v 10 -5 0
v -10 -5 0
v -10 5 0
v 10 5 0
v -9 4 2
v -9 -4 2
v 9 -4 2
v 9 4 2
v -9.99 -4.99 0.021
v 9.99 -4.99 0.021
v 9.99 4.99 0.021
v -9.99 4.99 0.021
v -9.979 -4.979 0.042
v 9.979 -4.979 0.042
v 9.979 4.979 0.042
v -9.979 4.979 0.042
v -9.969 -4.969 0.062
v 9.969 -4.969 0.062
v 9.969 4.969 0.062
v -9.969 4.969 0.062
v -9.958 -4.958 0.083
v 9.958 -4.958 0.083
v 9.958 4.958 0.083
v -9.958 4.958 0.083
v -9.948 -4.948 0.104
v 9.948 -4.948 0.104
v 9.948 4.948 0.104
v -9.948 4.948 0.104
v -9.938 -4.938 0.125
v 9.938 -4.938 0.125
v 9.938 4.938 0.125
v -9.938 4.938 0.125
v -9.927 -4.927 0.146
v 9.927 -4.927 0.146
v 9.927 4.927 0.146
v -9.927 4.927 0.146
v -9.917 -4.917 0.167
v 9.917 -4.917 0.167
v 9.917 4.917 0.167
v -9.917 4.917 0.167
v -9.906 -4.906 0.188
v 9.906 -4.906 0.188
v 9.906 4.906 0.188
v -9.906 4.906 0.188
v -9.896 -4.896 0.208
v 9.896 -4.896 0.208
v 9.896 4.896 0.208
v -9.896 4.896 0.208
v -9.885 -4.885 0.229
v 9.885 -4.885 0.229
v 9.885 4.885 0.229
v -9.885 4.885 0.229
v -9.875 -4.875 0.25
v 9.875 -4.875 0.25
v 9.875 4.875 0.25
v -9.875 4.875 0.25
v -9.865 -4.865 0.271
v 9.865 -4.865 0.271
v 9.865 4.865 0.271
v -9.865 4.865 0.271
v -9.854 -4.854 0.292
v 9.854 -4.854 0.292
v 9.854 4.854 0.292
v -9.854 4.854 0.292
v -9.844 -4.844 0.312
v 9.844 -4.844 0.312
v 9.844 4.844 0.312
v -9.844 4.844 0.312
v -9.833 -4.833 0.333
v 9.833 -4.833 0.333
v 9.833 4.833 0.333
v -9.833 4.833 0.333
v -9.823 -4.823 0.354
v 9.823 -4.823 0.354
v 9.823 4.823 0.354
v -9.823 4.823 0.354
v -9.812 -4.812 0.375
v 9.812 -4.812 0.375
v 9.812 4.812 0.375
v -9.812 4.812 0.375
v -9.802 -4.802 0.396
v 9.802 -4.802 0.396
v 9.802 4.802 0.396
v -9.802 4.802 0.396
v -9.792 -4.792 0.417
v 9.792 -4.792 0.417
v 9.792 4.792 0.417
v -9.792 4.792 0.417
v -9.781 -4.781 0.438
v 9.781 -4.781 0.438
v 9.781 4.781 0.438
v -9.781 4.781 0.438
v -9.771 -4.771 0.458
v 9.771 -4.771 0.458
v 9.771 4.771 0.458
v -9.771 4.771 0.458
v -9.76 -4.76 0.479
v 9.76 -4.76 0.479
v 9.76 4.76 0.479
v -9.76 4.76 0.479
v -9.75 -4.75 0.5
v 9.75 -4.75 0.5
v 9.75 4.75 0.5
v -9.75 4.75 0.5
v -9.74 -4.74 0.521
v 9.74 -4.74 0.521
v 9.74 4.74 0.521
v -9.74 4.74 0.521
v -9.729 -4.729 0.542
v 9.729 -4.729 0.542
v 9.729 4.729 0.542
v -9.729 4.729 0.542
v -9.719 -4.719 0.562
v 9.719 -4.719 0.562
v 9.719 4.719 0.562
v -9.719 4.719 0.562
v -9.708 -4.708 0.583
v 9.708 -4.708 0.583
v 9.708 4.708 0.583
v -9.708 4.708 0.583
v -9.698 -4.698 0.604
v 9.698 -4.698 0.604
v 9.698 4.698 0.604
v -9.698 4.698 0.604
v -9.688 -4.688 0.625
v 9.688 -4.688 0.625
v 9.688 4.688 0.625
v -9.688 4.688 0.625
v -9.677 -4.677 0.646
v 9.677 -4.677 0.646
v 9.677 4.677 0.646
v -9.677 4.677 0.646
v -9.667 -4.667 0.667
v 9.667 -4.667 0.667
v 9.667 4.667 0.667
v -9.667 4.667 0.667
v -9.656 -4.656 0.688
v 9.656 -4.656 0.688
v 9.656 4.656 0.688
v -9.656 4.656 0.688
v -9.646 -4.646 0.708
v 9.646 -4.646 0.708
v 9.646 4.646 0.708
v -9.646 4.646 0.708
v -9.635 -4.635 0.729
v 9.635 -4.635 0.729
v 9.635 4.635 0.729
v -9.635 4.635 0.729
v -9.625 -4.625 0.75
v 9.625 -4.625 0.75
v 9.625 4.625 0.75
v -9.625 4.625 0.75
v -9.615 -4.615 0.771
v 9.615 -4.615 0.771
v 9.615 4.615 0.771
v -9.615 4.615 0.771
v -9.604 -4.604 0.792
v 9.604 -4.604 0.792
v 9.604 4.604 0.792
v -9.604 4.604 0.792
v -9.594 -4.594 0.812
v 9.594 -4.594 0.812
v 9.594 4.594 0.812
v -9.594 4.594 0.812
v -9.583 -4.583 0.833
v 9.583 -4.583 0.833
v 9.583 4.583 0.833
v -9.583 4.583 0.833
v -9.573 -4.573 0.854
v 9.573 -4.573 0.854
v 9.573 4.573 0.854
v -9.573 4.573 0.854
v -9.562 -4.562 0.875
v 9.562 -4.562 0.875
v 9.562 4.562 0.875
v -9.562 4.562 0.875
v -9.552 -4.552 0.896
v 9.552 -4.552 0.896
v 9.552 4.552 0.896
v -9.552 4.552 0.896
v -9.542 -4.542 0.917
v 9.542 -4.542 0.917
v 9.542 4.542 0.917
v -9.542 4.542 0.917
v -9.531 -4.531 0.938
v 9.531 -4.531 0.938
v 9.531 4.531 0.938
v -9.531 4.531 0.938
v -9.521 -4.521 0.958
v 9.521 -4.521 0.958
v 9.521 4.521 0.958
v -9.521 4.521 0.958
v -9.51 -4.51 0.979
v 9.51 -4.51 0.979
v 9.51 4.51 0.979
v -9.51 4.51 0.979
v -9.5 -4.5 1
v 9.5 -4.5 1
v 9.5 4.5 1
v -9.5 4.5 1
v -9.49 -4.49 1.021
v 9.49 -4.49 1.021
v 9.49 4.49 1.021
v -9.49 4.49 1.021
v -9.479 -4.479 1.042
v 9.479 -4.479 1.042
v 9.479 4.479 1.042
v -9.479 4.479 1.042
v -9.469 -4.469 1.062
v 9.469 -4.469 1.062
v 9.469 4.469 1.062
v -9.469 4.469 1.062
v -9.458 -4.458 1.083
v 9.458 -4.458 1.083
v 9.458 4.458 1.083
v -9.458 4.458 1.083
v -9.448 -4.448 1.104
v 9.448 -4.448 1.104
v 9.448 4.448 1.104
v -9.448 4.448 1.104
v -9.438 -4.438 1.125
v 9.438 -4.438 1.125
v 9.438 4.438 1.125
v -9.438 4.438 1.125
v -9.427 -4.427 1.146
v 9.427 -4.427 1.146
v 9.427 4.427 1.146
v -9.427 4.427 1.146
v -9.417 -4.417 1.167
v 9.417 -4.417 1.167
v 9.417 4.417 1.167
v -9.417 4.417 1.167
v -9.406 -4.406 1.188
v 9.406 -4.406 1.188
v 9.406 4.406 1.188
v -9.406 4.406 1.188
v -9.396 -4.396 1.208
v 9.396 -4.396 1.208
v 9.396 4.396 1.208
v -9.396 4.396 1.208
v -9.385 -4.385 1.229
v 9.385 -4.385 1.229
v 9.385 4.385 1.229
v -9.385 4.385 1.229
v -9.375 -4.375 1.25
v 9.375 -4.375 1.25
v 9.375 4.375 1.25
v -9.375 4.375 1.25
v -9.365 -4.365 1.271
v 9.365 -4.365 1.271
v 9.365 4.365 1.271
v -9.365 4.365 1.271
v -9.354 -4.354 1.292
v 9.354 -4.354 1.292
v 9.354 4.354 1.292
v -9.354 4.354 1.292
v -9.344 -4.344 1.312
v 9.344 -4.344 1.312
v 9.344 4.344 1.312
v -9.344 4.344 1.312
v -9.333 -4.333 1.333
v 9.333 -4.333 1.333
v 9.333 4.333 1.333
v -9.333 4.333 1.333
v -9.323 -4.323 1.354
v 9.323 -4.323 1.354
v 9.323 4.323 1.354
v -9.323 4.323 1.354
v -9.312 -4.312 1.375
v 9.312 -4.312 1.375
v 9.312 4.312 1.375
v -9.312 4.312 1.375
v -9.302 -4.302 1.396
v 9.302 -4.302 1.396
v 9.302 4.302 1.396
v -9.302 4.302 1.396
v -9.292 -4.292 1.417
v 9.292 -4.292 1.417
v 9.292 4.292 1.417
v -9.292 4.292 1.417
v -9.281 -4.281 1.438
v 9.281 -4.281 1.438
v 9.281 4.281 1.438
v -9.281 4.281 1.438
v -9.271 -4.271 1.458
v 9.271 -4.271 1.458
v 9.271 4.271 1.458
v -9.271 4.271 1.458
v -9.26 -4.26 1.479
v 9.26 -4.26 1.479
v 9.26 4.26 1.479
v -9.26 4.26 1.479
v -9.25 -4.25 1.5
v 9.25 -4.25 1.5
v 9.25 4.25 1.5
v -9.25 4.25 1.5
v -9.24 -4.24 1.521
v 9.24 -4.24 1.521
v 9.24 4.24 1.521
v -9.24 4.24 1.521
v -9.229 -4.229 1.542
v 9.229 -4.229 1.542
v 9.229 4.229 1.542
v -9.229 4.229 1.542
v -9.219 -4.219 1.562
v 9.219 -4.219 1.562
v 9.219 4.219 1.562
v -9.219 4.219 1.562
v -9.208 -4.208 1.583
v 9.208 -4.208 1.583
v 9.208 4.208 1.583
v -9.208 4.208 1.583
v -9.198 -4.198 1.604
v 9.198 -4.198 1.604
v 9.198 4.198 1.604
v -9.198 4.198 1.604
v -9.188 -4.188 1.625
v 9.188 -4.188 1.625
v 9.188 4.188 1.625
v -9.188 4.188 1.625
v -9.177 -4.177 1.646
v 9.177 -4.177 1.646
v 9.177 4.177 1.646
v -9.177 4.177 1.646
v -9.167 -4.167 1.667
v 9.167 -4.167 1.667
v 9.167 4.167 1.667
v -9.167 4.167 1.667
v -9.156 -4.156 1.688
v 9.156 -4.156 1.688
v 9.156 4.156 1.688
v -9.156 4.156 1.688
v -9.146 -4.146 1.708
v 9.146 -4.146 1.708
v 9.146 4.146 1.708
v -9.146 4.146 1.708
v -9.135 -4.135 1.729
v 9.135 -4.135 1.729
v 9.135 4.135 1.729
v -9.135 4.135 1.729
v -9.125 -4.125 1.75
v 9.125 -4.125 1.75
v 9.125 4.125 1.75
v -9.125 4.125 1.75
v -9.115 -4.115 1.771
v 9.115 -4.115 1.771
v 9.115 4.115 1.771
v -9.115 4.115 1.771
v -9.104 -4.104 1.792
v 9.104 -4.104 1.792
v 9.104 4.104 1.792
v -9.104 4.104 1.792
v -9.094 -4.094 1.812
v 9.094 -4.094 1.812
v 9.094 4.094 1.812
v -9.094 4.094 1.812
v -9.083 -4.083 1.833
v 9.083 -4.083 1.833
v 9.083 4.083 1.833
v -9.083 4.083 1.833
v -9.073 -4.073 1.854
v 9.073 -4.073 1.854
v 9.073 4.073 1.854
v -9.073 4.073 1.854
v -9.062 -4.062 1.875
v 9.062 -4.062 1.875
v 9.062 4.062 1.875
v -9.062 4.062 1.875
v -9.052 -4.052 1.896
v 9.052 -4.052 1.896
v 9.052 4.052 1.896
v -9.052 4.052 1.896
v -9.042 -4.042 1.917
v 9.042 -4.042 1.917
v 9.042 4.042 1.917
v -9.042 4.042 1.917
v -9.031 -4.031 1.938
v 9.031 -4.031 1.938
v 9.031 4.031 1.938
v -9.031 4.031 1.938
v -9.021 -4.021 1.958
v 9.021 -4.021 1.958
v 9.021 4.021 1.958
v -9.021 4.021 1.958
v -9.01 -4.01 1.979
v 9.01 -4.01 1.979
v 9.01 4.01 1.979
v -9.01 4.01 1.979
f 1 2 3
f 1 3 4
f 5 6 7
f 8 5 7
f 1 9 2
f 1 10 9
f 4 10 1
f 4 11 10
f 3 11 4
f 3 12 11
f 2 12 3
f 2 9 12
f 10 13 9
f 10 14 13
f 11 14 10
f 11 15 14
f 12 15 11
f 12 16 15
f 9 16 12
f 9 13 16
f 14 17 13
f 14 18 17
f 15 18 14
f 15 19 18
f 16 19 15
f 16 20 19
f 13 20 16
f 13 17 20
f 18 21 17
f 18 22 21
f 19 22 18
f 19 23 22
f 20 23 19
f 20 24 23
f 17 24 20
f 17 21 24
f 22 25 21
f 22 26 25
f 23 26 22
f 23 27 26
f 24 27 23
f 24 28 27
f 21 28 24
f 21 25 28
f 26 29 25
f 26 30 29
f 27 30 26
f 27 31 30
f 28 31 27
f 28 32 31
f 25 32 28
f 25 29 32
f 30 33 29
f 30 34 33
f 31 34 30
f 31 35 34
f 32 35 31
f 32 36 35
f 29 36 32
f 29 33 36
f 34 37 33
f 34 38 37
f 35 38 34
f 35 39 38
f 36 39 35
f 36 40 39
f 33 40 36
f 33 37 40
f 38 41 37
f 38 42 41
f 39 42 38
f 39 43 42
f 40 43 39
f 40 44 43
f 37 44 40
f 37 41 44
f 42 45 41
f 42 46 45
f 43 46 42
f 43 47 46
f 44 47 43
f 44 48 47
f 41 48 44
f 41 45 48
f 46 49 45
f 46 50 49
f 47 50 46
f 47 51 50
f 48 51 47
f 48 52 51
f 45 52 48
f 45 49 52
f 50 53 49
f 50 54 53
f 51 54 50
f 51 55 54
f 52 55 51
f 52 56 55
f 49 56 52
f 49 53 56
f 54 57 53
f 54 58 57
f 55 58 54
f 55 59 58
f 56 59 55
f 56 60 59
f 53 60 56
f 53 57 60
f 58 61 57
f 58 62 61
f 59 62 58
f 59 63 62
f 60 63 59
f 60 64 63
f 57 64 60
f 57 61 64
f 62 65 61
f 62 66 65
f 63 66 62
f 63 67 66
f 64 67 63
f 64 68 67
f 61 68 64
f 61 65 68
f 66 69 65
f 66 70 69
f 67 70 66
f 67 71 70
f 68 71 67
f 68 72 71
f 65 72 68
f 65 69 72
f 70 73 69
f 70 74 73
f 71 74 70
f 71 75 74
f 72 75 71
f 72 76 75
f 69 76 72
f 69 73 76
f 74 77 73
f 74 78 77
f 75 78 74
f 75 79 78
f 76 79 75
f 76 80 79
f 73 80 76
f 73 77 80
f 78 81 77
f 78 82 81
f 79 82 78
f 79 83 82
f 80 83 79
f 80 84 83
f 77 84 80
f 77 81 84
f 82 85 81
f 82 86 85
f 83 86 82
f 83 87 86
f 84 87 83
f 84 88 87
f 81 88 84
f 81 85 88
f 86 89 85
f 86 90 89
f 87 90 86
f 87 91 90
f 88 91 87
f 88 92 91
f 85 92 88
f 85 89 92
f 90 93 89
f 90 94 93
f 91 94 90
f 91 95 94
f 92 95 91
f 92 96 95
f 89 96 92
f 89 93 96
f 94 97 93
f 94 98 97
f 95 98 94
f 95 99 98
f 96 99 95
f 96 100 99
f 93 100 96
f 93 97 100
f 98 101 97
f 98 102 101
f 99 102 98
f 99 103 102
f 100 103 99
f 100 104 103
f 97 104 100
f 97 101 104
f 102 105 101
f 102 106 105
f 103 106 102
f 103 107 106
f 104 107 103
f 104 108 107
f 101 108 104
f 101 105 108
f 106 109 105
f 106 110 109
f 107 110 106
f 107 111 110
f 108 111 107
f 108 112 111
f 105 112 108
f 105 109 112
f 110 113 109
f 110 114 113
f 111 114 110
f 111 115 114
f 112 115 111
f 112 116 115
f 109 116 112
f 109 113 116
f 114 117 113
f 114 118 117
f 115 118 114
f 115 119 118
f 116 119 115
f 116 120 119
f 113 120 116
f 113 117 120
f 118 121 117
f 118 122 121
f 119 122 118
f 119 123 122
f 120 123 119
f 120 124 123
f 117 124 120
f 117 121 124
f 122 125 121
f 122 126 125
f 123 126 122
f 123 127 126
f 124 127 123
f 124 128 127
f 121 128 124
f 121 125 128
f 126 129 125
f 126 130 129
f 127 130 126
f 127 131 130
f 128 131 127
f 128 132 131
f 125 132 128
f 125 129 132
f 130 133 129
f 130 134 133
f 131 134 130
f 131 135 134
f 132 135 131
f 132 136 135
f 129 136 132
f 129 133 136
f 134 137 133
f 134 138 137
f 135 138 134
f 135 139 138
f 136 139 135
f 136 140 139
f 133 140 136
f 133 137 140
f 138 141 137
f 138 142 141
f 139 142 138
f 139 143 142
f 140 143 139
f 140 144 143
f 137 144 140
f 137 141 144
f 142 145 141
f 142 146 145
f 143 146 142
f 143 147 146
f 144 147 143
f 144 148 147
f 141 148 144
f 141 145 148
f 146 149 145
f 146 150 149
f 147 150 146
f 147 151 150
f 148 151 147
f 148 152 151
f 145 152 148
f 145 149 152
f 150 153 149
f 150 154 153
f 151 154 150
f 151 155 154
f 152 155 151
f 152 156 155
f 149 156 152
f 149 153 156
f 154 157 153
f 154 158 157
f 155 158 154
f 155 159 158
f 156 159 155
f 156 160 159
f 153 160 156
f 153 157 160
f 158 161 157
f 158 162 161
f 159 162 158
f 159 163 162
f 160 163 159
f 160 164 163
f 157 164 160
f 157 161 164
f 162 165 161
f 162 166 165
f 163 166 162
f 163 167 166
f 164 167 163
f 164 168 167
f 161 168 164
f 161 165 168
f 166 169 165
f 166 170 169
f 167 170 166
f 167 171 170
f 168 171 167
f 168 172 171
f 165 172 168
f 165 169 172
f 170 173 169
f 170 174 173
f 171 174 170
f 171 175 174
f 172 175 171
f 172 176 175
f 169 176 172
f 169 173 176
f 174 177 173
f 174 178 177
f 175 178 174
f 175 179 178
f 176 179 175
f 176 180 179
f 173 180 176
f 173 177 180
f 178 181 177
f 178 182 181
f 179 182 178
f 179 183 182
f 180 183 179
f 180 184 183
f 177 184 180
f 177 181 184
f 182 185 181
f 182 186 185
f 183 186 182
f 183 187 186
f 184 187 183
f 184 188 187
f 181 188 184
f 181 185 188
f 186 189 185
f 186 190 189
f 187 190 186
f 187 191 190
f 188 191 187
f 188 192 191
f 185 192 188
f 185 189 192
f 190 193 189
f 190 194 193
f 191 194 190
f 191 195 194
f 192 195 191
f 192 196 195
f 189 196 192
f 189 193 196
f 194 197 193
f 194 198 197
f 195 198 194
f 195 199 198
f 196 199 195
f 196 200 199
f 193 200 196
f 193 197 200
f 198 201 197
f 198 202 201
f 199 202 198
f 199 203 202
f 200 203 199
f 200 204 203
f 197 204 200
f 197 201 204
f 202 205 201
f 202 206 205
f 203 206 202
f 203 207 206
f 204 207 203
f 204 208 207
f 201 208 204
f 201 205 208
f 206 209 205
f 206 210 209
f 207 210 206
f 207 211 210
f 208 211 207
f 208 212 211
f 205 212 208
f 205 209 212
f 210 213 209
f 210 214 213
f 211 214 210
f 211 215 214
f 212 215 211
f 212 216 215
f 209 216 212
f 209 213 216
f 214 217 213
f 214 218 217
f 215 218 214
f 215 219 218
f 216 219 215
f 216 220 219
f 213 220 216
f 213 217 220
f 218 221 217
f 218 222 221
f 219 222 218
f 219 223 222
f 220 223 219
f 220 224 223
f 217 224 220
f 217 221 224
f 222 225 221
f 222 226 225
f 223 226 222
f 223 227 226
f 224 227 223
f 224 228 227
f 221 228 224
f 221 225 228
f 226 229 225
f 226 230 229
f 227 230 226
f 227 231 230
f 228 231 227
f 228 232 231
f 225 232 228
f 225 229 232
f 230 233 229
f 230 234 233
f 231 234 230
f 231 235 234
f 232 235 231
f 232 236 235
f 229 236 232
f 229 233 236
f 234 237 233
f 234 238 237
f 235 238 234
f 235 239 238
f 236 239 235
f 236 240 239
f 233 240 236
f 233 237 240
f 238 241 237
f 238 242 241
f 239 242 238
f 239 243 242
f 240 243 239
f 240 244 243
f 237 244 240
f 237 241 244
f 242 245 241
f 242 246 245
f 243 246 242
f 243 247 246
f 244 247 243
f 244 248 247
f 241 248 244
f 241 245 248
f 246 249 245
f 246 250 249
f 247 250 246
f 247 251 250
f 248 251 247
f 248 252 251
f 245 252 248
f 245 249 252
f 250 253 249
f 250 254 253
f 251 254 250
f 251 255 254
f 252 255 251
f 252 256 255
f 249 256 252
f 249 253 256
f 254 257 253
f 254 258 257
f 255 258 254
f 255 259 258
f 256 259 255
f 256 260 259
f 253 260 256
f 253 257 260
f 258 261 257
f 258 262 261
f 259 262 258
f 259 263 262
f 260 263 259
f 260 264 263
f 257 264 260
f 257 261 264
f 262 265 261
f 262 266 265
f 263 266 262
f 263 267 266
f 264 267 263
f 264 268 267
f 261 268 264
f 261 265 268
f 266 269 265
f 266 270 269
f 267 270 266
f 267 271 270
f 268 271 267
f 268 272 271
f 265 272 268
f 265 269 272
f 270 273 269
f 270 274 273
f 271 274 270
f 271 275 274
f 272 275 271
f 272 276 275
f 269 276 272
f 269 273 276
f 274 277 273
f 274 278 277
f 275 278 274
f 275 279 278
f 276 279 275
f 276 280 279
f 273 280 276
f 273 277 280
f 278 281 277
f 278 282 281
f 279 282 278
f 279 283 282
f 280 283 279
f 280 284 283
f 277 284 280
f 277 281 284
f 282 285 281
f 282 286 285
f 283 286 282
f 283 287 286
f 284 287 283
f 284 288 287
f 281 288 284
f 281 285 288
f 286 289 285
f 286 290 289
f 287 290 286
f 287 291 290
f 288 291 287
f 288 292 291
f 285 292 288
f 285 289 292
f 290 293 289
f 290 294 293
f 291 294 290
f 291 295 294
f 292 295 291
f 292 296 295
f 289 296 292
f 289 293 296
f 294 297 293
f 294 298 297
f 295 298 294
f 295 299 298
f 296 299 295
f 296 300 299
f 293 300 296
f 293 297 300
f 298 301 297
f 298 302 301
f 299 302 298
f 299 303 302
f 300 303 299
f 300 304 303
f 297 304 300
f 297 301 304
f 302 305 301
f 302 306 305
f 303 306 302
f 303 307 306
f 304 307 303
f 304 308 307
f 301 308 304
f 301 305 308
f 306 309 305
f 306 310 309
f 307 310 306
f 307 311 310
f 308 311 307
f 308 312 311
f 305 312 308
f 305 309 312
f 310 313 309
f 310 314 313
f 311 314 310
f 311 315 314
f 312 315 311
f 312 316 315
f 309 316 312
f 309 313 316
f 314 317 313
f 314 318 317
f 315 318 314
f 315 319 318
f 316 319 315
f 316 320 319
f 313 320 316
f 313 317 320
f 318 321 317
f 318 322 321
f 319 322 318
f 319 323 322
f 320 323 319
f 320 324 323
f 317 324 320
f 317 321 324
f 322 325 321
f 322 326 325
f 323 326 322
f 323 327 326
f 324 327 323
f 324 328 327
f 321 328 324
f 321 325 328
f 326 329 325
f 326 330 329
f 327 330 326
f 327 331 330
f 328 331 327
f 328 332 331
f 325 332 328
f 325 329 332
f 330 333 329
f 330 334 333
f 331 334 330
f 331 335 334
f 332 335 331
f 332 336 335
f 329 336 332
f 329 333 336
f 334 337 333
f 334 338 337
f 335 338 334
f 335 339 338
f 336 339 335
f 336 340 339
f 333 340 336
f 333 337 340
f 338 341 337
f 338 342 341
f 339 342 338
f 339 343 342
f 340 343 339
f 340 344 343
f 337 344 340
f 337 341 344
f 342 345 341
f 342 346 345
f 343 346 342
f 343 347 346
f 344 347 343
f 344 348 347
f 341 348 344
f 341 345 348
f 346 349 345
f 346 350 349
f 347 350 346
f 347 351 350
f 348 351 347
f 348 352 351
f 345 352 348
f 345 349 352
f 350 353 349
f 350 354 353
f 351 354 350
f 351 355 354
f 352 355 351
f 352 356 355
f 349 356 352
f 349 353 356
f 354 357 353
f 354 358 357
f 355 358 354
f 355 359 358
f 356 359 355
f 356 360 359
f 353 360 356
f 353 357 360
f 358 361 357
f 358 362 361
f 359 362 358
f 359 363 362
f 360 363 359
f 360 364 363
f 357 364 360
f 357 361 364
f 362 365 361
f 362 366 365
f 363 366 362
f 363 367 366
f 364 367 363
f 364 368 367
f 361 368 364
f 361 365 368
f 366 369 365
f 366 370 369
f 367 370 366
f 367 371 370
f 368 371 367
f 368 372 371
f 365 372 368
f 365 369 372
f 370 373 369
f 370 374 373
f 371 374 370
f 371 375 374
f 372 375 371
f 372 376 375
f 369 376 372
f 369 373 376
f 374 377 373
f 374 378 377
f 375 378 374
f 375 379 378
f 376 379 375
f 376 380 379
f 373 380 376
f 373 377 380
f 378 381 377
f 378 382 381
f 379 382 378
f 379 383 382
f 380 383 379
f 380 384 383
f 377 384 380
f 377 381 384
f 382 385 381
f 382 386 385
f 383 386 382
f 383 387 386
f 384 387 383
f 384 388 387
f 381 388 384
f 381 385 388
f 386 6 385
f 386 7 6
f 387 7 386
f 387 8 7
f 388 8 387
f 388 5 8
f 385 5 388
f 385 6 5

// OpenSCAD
// Auto-generated from tests/data/feature_fixtures_manifest.json
// fixture: plate_plain_chamfered_edges
// fixture_type: plate
// description: Plain plate with a uniform edge chamfer that breaks the side boundary planes while preserving the overall plate envelope.
$fn = 96;

plate_size = [20.000000, 10.000000, 2.000000];
plate_origin = [-10.000000, -5.000000, 0.000000];

module through_hole(center, diameter, height) {
  translate(center) cylinder(d=diameter, h=height, center=false);
}

module through_slot(start, end, width, height) {
  hull() {
    through_hole(start, width, height);
    through_hole(end, width, height);
  }
}

module counterbore_hole(center, through_d, bore_d, bore_depth, plate_thickness) {
  translate([center[0], center[1], -0.1])
    cylinder(d=through_d, h=plate_thickness + 0.2, center=false);
  translate([center[0], center[1], plate_thickness - bore_depth])
    cylinder(d=bore_d, h=bore_depth + 0.1, center=false);
}

plate_edge_chamfer = 1.000000;
plate_top_scale = [0.900000, 0.800000];

difference() {
  linear_extrude(height=plate_size[2], scale=plate_top_scale) square([plate_size[0], plate_size[1]], center=true);
}
